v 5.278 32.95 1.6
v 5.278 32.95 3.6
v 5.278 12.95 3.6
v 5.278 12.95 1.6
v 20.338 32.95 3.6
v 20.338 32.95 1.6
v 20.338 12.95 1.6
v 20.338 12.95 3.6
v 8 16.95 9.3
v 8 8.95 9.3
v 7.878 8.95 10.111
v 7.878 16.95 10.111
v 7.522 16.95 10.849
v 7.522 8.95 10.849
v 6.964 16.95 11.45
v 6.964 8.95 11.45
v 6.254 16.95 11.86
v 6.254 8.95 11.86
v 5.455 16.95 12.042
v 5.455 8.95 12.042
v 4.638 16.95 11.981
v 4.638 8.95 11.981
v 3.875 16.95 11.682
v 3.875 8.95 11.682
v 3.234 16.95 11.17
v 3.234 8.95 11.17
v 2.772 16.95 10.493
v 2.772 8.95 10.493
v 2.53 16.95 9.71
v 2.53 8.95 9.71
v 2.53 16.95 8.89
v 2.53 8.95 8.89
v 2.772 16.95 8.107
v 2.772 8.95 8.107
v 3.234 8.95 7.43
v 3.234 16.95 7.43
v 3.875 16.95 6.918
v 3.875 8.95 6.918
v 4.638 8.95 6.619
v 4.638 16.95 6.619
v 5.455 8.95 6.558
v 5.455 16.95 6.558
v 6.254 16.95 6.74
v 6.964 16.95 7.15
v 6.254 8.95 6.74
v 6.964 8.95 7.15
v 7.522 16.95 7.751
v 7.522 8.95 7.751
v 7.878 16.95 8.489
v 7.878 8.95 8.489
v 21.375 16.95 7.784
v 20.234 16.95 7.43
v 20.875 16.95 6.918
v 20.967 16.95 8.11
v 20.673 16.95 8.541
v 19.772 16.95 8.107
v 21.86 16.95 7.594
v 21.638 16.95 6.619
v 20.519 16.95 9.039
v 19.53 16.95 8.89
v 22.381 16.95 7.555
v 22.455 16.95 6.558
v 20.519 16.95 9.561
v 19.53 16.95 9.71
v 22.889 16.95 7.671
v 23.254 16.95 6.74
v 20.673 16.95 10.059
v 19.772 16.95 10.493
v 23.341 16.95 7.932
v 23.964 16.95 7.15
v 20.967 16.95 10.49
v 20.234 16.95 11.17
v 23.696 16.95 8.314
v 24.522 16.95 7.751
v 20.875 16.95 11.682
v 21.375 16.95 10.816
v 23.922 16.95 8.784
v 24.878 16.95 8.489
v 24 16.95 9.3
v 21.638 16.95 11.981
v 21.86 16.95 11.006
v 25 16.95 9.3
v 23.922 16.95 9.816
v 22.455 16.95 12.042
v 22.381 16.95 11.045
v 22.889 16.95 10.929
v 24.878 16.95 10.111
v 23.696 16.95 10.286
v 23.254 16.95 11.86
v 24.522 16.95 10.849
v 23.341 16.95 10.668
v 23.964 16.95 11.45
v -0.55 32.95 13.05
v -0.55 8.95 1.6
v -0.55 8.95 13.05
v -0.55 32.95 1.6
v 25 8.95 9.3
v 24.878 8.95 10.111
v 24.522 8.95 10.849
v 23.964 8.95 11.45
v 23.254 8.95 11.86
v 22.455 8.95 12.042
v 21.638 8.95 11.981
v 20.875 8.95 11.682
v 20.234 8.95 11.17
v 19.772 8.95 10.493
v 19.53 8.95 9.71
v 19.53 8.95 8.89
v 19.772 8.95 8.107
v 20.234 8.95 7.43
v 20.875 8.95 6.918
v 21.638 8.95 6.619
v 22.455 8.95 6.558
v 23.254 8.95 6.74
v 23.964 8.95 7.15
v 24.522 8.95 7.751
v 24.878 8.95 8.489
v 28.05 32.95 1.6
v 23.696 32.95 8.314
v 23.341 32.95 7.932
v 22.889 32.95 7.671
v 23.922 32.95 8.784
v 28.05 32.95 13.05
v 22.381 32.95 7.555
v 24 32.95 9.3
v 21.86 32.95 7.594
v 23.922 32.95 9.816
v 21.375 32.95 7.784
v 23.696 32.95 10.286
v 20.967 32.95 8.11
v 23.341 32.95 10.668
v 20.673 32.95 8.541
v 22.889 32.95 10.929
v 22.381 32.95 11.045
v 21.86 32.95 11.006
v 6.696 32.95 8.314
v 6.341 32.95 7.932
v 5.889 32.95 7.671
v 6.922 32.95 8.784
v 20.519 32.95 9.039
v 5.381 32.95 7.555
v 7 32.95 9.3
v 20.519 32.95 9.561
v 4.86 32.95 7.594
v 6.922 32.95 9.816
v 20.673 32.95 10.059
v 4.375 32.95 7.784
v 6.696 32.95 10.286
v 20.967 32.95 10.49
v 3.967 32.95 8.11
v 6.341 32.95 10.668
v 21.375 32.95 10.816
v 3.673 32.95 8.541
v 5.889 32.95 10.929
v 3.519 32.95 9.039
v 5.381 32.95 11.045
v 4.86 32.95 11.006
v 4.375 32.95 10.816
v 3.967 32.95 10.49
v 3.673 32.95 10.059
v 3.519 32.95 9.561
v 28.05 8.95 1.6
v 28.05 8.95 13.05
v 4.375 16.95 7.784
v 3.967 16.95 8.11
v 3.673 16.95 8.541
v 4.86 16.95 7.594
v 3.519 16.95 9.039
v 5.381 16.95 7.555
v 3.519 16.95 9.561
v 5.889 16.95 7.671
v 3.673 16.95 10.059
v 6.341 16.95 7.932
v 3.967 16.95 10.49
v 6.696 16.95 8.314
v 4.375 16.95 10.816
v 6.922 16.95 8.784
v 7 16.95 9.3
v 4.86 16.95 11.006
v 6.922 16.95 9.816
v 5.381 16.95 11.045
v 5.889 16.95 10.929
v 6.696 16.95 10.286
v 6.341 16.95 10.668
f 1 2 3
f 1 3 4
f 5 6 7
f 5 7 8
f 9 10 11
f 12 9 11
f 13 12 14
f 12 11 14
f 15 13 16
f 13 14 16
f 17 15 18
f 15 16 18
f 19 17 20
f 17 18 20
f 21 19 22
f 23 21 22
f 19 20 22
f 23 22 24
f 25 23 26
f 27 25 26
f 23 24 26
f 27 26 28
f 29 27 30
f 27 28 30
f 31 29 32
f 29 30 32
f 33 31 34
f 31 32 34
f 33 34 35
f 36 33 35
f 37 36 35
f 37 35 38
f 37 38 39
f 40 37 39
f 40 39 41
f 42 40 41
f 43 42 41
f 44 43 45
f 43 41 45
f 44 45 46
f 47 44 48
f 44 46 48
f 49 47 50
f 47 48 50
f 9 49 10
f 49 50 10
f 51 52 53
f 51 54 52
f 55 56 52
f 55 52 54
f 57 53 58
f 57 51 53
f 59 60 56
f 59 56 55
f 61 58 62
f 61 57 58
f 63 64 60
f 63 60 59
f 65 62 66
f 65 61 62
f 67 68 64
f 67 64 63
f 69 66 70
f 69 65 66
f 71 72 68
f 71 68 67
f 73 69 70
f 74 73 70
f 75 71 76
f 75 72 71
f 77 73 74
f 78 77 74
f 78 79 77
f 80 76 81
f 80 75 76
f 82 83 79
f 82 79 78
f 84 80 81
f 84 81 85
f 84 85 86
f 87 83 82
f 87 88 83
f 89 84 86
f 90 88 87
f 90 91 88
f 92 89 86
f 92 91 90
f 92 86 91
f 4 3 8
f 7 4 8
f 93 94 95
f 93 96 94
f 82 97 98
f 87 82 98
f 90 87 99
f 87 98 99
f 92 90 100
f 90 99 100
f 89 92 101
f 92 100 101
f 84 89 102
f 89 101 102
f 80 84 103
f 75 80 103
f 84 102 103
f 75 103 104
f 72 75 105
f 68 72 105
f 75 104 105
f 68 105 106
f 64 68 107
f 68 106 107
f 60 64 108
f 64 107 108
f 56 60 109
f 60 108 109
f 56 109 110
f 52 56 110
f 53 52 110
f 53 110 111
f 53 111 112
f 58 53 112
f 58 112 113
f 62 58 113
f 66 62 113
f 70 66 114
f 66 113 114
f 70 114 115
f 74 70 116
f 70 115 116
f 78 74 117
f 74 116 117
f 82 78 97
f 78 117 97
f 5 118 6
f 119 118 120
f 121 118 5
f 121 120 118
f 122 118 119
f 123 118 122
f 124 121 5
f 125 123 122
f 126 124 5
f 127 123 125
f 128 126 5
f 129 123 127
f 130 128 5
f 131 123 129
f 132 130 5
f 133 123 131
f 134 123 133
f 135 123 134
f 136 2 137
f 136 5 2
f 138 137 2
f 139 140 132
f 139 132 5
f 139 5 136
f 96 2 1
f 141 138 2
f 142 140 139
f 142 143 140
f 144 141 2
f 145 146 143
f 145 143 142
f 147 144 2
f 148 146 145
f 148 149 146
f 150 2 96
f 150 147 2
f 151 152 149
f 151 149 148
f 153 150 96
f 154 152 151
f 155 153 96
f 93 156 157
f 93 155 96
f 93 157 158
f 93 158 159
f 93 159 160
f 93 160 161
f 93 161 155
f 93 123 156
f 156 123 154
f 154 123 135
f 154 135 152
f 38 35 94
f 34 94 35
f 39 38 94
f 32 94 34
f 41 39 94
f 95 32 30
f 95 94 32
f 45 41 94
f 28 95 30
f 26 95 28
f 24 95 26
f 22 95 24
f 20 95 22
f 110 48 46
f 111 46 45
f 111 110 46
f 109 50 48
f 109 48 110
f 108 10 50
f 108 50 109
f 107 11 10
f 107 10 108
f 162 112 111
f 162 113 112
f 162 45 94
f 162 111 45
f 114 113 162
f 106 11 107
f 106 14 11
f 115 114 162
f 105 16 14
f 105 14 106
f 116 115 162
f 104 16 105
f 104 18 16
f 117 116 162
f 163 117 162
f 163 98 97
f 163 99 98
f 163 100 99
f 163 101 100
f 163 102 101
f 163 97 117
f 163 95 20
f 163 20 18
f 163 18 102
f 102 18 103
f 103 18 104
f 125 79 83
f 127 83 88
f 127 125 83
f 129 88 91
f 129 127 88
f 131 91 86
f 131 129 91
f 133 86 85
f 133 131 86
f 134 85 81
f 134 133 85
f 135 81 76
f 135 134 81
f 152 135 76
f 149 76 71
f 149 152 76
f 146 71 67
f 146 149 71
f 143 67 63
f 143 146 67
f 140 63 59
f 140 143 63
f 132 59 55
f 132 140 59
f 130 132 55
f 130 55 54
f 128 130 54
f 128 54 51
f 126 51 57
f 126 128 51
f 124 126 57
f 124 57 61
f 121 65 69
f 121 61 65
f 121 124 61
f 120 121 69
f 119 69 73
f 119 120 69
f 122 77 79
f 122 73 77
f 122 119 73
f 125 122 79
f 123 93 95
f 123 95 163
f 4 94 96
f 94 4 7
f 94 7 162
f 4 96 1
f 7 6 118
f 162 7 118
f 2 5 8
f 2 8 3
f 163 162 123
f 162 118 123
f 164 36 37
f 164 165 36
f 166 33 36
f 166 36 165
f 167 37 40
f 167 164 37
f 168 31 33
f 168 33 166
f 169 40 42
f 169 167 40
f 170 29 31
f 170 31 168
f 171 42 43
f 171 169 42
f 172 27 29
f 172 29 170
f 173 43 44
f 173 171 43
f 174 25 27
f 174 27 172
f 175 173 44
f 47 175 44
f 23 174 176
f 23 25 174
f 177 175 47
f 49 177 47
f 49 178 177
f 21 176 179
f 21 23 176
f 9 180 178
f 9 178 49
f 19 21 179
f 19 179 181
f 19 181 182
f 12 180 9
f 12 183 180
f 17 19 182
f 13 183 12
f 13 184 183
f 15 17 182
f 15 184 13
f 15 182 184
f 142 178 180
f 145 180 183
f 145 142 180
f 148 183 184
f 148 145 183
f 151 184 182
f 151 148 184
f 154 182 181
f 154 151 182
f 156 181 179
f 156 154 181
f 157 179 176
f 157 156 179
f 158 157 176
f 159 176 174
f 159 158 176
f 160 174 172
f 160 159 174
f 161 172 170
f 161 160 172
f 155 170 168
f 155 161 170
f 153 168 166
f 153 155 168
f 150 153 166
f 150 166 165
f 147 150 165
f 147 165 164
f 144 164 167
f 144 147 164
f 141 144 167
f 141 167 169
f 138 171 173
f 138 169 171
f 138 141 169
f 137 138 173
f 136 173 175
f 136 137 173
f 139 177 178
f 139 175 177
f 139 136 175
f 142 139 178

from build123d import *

# Parameters (mm, degrees)
SKETCH018_R     = 1.75
PAD009_DEPTH    = 20
SKETCH019_W     = 28.6
SKETCH019_H     = 11.45
SKETCH019_R     = 1.75
PAD010_DEPTH    = 4
SKETCH020_R     = 2.75
POCKET009_DEPTH = 8


with BuildPart() as part:
    # Sketch018 (on Face21 of Binder005) → Pad009 (new body)
    with BuildSketch(Plane.XZ.offset(-32.95)):
        Polygon((-0.55022, 13.05), (28.04978, 13.05), (28.04978, 1.6), (20.338297, 1.6), (20.338297, 3.6), (5.278297, 3.6), (5.278297, 1.6), (-0.55022, 1.6), align=None)
        with Locations((5.24978, 9.3)):
            Circle(SKETCH018_R, mode=Mode.SUBTRACT)
        with Locations((22.24978, 9.3)):
            Circle(SKETCH018_R, mode=Mode.SUBTRACT)
    extrude(amount=PAD009_DEPTH)

    # Sketch019 (on Face12 of Pad009) → Pad010 (join)
    with BuildSketch(Plane.XZ.offset(-12.95)):
        with Locations((13.74978, 7.325)):
            Rectangle(SKETCH019_W, SKETCH019_H)
        with Locations((5.24978, 9.3)):
            Circle(SKETCH019_R, mode=Mode.SUBTRACT)
        with Locations((22.24978, 9.3)):
            Circle(SKETCH019_R, mode=Mode.SUBTRACT)
    extrude(amount=PAD010_DEPTH)

    # Sketch020 (on Face1 of Pad010) → Pocket009 (cut)
    with BuildSketch(Plane.XZ.offset(-8.95)):
        with Locations((22.24978, 9.3)):
            Circle(SKETCH020_R)
        with Locations((5.24978, 9.3)):
            Circle(SKETCH020_R)
    extrude(amount=-POCKET009_DEPTH, mode=Mode.SUBTRACT)


solid = part.part
